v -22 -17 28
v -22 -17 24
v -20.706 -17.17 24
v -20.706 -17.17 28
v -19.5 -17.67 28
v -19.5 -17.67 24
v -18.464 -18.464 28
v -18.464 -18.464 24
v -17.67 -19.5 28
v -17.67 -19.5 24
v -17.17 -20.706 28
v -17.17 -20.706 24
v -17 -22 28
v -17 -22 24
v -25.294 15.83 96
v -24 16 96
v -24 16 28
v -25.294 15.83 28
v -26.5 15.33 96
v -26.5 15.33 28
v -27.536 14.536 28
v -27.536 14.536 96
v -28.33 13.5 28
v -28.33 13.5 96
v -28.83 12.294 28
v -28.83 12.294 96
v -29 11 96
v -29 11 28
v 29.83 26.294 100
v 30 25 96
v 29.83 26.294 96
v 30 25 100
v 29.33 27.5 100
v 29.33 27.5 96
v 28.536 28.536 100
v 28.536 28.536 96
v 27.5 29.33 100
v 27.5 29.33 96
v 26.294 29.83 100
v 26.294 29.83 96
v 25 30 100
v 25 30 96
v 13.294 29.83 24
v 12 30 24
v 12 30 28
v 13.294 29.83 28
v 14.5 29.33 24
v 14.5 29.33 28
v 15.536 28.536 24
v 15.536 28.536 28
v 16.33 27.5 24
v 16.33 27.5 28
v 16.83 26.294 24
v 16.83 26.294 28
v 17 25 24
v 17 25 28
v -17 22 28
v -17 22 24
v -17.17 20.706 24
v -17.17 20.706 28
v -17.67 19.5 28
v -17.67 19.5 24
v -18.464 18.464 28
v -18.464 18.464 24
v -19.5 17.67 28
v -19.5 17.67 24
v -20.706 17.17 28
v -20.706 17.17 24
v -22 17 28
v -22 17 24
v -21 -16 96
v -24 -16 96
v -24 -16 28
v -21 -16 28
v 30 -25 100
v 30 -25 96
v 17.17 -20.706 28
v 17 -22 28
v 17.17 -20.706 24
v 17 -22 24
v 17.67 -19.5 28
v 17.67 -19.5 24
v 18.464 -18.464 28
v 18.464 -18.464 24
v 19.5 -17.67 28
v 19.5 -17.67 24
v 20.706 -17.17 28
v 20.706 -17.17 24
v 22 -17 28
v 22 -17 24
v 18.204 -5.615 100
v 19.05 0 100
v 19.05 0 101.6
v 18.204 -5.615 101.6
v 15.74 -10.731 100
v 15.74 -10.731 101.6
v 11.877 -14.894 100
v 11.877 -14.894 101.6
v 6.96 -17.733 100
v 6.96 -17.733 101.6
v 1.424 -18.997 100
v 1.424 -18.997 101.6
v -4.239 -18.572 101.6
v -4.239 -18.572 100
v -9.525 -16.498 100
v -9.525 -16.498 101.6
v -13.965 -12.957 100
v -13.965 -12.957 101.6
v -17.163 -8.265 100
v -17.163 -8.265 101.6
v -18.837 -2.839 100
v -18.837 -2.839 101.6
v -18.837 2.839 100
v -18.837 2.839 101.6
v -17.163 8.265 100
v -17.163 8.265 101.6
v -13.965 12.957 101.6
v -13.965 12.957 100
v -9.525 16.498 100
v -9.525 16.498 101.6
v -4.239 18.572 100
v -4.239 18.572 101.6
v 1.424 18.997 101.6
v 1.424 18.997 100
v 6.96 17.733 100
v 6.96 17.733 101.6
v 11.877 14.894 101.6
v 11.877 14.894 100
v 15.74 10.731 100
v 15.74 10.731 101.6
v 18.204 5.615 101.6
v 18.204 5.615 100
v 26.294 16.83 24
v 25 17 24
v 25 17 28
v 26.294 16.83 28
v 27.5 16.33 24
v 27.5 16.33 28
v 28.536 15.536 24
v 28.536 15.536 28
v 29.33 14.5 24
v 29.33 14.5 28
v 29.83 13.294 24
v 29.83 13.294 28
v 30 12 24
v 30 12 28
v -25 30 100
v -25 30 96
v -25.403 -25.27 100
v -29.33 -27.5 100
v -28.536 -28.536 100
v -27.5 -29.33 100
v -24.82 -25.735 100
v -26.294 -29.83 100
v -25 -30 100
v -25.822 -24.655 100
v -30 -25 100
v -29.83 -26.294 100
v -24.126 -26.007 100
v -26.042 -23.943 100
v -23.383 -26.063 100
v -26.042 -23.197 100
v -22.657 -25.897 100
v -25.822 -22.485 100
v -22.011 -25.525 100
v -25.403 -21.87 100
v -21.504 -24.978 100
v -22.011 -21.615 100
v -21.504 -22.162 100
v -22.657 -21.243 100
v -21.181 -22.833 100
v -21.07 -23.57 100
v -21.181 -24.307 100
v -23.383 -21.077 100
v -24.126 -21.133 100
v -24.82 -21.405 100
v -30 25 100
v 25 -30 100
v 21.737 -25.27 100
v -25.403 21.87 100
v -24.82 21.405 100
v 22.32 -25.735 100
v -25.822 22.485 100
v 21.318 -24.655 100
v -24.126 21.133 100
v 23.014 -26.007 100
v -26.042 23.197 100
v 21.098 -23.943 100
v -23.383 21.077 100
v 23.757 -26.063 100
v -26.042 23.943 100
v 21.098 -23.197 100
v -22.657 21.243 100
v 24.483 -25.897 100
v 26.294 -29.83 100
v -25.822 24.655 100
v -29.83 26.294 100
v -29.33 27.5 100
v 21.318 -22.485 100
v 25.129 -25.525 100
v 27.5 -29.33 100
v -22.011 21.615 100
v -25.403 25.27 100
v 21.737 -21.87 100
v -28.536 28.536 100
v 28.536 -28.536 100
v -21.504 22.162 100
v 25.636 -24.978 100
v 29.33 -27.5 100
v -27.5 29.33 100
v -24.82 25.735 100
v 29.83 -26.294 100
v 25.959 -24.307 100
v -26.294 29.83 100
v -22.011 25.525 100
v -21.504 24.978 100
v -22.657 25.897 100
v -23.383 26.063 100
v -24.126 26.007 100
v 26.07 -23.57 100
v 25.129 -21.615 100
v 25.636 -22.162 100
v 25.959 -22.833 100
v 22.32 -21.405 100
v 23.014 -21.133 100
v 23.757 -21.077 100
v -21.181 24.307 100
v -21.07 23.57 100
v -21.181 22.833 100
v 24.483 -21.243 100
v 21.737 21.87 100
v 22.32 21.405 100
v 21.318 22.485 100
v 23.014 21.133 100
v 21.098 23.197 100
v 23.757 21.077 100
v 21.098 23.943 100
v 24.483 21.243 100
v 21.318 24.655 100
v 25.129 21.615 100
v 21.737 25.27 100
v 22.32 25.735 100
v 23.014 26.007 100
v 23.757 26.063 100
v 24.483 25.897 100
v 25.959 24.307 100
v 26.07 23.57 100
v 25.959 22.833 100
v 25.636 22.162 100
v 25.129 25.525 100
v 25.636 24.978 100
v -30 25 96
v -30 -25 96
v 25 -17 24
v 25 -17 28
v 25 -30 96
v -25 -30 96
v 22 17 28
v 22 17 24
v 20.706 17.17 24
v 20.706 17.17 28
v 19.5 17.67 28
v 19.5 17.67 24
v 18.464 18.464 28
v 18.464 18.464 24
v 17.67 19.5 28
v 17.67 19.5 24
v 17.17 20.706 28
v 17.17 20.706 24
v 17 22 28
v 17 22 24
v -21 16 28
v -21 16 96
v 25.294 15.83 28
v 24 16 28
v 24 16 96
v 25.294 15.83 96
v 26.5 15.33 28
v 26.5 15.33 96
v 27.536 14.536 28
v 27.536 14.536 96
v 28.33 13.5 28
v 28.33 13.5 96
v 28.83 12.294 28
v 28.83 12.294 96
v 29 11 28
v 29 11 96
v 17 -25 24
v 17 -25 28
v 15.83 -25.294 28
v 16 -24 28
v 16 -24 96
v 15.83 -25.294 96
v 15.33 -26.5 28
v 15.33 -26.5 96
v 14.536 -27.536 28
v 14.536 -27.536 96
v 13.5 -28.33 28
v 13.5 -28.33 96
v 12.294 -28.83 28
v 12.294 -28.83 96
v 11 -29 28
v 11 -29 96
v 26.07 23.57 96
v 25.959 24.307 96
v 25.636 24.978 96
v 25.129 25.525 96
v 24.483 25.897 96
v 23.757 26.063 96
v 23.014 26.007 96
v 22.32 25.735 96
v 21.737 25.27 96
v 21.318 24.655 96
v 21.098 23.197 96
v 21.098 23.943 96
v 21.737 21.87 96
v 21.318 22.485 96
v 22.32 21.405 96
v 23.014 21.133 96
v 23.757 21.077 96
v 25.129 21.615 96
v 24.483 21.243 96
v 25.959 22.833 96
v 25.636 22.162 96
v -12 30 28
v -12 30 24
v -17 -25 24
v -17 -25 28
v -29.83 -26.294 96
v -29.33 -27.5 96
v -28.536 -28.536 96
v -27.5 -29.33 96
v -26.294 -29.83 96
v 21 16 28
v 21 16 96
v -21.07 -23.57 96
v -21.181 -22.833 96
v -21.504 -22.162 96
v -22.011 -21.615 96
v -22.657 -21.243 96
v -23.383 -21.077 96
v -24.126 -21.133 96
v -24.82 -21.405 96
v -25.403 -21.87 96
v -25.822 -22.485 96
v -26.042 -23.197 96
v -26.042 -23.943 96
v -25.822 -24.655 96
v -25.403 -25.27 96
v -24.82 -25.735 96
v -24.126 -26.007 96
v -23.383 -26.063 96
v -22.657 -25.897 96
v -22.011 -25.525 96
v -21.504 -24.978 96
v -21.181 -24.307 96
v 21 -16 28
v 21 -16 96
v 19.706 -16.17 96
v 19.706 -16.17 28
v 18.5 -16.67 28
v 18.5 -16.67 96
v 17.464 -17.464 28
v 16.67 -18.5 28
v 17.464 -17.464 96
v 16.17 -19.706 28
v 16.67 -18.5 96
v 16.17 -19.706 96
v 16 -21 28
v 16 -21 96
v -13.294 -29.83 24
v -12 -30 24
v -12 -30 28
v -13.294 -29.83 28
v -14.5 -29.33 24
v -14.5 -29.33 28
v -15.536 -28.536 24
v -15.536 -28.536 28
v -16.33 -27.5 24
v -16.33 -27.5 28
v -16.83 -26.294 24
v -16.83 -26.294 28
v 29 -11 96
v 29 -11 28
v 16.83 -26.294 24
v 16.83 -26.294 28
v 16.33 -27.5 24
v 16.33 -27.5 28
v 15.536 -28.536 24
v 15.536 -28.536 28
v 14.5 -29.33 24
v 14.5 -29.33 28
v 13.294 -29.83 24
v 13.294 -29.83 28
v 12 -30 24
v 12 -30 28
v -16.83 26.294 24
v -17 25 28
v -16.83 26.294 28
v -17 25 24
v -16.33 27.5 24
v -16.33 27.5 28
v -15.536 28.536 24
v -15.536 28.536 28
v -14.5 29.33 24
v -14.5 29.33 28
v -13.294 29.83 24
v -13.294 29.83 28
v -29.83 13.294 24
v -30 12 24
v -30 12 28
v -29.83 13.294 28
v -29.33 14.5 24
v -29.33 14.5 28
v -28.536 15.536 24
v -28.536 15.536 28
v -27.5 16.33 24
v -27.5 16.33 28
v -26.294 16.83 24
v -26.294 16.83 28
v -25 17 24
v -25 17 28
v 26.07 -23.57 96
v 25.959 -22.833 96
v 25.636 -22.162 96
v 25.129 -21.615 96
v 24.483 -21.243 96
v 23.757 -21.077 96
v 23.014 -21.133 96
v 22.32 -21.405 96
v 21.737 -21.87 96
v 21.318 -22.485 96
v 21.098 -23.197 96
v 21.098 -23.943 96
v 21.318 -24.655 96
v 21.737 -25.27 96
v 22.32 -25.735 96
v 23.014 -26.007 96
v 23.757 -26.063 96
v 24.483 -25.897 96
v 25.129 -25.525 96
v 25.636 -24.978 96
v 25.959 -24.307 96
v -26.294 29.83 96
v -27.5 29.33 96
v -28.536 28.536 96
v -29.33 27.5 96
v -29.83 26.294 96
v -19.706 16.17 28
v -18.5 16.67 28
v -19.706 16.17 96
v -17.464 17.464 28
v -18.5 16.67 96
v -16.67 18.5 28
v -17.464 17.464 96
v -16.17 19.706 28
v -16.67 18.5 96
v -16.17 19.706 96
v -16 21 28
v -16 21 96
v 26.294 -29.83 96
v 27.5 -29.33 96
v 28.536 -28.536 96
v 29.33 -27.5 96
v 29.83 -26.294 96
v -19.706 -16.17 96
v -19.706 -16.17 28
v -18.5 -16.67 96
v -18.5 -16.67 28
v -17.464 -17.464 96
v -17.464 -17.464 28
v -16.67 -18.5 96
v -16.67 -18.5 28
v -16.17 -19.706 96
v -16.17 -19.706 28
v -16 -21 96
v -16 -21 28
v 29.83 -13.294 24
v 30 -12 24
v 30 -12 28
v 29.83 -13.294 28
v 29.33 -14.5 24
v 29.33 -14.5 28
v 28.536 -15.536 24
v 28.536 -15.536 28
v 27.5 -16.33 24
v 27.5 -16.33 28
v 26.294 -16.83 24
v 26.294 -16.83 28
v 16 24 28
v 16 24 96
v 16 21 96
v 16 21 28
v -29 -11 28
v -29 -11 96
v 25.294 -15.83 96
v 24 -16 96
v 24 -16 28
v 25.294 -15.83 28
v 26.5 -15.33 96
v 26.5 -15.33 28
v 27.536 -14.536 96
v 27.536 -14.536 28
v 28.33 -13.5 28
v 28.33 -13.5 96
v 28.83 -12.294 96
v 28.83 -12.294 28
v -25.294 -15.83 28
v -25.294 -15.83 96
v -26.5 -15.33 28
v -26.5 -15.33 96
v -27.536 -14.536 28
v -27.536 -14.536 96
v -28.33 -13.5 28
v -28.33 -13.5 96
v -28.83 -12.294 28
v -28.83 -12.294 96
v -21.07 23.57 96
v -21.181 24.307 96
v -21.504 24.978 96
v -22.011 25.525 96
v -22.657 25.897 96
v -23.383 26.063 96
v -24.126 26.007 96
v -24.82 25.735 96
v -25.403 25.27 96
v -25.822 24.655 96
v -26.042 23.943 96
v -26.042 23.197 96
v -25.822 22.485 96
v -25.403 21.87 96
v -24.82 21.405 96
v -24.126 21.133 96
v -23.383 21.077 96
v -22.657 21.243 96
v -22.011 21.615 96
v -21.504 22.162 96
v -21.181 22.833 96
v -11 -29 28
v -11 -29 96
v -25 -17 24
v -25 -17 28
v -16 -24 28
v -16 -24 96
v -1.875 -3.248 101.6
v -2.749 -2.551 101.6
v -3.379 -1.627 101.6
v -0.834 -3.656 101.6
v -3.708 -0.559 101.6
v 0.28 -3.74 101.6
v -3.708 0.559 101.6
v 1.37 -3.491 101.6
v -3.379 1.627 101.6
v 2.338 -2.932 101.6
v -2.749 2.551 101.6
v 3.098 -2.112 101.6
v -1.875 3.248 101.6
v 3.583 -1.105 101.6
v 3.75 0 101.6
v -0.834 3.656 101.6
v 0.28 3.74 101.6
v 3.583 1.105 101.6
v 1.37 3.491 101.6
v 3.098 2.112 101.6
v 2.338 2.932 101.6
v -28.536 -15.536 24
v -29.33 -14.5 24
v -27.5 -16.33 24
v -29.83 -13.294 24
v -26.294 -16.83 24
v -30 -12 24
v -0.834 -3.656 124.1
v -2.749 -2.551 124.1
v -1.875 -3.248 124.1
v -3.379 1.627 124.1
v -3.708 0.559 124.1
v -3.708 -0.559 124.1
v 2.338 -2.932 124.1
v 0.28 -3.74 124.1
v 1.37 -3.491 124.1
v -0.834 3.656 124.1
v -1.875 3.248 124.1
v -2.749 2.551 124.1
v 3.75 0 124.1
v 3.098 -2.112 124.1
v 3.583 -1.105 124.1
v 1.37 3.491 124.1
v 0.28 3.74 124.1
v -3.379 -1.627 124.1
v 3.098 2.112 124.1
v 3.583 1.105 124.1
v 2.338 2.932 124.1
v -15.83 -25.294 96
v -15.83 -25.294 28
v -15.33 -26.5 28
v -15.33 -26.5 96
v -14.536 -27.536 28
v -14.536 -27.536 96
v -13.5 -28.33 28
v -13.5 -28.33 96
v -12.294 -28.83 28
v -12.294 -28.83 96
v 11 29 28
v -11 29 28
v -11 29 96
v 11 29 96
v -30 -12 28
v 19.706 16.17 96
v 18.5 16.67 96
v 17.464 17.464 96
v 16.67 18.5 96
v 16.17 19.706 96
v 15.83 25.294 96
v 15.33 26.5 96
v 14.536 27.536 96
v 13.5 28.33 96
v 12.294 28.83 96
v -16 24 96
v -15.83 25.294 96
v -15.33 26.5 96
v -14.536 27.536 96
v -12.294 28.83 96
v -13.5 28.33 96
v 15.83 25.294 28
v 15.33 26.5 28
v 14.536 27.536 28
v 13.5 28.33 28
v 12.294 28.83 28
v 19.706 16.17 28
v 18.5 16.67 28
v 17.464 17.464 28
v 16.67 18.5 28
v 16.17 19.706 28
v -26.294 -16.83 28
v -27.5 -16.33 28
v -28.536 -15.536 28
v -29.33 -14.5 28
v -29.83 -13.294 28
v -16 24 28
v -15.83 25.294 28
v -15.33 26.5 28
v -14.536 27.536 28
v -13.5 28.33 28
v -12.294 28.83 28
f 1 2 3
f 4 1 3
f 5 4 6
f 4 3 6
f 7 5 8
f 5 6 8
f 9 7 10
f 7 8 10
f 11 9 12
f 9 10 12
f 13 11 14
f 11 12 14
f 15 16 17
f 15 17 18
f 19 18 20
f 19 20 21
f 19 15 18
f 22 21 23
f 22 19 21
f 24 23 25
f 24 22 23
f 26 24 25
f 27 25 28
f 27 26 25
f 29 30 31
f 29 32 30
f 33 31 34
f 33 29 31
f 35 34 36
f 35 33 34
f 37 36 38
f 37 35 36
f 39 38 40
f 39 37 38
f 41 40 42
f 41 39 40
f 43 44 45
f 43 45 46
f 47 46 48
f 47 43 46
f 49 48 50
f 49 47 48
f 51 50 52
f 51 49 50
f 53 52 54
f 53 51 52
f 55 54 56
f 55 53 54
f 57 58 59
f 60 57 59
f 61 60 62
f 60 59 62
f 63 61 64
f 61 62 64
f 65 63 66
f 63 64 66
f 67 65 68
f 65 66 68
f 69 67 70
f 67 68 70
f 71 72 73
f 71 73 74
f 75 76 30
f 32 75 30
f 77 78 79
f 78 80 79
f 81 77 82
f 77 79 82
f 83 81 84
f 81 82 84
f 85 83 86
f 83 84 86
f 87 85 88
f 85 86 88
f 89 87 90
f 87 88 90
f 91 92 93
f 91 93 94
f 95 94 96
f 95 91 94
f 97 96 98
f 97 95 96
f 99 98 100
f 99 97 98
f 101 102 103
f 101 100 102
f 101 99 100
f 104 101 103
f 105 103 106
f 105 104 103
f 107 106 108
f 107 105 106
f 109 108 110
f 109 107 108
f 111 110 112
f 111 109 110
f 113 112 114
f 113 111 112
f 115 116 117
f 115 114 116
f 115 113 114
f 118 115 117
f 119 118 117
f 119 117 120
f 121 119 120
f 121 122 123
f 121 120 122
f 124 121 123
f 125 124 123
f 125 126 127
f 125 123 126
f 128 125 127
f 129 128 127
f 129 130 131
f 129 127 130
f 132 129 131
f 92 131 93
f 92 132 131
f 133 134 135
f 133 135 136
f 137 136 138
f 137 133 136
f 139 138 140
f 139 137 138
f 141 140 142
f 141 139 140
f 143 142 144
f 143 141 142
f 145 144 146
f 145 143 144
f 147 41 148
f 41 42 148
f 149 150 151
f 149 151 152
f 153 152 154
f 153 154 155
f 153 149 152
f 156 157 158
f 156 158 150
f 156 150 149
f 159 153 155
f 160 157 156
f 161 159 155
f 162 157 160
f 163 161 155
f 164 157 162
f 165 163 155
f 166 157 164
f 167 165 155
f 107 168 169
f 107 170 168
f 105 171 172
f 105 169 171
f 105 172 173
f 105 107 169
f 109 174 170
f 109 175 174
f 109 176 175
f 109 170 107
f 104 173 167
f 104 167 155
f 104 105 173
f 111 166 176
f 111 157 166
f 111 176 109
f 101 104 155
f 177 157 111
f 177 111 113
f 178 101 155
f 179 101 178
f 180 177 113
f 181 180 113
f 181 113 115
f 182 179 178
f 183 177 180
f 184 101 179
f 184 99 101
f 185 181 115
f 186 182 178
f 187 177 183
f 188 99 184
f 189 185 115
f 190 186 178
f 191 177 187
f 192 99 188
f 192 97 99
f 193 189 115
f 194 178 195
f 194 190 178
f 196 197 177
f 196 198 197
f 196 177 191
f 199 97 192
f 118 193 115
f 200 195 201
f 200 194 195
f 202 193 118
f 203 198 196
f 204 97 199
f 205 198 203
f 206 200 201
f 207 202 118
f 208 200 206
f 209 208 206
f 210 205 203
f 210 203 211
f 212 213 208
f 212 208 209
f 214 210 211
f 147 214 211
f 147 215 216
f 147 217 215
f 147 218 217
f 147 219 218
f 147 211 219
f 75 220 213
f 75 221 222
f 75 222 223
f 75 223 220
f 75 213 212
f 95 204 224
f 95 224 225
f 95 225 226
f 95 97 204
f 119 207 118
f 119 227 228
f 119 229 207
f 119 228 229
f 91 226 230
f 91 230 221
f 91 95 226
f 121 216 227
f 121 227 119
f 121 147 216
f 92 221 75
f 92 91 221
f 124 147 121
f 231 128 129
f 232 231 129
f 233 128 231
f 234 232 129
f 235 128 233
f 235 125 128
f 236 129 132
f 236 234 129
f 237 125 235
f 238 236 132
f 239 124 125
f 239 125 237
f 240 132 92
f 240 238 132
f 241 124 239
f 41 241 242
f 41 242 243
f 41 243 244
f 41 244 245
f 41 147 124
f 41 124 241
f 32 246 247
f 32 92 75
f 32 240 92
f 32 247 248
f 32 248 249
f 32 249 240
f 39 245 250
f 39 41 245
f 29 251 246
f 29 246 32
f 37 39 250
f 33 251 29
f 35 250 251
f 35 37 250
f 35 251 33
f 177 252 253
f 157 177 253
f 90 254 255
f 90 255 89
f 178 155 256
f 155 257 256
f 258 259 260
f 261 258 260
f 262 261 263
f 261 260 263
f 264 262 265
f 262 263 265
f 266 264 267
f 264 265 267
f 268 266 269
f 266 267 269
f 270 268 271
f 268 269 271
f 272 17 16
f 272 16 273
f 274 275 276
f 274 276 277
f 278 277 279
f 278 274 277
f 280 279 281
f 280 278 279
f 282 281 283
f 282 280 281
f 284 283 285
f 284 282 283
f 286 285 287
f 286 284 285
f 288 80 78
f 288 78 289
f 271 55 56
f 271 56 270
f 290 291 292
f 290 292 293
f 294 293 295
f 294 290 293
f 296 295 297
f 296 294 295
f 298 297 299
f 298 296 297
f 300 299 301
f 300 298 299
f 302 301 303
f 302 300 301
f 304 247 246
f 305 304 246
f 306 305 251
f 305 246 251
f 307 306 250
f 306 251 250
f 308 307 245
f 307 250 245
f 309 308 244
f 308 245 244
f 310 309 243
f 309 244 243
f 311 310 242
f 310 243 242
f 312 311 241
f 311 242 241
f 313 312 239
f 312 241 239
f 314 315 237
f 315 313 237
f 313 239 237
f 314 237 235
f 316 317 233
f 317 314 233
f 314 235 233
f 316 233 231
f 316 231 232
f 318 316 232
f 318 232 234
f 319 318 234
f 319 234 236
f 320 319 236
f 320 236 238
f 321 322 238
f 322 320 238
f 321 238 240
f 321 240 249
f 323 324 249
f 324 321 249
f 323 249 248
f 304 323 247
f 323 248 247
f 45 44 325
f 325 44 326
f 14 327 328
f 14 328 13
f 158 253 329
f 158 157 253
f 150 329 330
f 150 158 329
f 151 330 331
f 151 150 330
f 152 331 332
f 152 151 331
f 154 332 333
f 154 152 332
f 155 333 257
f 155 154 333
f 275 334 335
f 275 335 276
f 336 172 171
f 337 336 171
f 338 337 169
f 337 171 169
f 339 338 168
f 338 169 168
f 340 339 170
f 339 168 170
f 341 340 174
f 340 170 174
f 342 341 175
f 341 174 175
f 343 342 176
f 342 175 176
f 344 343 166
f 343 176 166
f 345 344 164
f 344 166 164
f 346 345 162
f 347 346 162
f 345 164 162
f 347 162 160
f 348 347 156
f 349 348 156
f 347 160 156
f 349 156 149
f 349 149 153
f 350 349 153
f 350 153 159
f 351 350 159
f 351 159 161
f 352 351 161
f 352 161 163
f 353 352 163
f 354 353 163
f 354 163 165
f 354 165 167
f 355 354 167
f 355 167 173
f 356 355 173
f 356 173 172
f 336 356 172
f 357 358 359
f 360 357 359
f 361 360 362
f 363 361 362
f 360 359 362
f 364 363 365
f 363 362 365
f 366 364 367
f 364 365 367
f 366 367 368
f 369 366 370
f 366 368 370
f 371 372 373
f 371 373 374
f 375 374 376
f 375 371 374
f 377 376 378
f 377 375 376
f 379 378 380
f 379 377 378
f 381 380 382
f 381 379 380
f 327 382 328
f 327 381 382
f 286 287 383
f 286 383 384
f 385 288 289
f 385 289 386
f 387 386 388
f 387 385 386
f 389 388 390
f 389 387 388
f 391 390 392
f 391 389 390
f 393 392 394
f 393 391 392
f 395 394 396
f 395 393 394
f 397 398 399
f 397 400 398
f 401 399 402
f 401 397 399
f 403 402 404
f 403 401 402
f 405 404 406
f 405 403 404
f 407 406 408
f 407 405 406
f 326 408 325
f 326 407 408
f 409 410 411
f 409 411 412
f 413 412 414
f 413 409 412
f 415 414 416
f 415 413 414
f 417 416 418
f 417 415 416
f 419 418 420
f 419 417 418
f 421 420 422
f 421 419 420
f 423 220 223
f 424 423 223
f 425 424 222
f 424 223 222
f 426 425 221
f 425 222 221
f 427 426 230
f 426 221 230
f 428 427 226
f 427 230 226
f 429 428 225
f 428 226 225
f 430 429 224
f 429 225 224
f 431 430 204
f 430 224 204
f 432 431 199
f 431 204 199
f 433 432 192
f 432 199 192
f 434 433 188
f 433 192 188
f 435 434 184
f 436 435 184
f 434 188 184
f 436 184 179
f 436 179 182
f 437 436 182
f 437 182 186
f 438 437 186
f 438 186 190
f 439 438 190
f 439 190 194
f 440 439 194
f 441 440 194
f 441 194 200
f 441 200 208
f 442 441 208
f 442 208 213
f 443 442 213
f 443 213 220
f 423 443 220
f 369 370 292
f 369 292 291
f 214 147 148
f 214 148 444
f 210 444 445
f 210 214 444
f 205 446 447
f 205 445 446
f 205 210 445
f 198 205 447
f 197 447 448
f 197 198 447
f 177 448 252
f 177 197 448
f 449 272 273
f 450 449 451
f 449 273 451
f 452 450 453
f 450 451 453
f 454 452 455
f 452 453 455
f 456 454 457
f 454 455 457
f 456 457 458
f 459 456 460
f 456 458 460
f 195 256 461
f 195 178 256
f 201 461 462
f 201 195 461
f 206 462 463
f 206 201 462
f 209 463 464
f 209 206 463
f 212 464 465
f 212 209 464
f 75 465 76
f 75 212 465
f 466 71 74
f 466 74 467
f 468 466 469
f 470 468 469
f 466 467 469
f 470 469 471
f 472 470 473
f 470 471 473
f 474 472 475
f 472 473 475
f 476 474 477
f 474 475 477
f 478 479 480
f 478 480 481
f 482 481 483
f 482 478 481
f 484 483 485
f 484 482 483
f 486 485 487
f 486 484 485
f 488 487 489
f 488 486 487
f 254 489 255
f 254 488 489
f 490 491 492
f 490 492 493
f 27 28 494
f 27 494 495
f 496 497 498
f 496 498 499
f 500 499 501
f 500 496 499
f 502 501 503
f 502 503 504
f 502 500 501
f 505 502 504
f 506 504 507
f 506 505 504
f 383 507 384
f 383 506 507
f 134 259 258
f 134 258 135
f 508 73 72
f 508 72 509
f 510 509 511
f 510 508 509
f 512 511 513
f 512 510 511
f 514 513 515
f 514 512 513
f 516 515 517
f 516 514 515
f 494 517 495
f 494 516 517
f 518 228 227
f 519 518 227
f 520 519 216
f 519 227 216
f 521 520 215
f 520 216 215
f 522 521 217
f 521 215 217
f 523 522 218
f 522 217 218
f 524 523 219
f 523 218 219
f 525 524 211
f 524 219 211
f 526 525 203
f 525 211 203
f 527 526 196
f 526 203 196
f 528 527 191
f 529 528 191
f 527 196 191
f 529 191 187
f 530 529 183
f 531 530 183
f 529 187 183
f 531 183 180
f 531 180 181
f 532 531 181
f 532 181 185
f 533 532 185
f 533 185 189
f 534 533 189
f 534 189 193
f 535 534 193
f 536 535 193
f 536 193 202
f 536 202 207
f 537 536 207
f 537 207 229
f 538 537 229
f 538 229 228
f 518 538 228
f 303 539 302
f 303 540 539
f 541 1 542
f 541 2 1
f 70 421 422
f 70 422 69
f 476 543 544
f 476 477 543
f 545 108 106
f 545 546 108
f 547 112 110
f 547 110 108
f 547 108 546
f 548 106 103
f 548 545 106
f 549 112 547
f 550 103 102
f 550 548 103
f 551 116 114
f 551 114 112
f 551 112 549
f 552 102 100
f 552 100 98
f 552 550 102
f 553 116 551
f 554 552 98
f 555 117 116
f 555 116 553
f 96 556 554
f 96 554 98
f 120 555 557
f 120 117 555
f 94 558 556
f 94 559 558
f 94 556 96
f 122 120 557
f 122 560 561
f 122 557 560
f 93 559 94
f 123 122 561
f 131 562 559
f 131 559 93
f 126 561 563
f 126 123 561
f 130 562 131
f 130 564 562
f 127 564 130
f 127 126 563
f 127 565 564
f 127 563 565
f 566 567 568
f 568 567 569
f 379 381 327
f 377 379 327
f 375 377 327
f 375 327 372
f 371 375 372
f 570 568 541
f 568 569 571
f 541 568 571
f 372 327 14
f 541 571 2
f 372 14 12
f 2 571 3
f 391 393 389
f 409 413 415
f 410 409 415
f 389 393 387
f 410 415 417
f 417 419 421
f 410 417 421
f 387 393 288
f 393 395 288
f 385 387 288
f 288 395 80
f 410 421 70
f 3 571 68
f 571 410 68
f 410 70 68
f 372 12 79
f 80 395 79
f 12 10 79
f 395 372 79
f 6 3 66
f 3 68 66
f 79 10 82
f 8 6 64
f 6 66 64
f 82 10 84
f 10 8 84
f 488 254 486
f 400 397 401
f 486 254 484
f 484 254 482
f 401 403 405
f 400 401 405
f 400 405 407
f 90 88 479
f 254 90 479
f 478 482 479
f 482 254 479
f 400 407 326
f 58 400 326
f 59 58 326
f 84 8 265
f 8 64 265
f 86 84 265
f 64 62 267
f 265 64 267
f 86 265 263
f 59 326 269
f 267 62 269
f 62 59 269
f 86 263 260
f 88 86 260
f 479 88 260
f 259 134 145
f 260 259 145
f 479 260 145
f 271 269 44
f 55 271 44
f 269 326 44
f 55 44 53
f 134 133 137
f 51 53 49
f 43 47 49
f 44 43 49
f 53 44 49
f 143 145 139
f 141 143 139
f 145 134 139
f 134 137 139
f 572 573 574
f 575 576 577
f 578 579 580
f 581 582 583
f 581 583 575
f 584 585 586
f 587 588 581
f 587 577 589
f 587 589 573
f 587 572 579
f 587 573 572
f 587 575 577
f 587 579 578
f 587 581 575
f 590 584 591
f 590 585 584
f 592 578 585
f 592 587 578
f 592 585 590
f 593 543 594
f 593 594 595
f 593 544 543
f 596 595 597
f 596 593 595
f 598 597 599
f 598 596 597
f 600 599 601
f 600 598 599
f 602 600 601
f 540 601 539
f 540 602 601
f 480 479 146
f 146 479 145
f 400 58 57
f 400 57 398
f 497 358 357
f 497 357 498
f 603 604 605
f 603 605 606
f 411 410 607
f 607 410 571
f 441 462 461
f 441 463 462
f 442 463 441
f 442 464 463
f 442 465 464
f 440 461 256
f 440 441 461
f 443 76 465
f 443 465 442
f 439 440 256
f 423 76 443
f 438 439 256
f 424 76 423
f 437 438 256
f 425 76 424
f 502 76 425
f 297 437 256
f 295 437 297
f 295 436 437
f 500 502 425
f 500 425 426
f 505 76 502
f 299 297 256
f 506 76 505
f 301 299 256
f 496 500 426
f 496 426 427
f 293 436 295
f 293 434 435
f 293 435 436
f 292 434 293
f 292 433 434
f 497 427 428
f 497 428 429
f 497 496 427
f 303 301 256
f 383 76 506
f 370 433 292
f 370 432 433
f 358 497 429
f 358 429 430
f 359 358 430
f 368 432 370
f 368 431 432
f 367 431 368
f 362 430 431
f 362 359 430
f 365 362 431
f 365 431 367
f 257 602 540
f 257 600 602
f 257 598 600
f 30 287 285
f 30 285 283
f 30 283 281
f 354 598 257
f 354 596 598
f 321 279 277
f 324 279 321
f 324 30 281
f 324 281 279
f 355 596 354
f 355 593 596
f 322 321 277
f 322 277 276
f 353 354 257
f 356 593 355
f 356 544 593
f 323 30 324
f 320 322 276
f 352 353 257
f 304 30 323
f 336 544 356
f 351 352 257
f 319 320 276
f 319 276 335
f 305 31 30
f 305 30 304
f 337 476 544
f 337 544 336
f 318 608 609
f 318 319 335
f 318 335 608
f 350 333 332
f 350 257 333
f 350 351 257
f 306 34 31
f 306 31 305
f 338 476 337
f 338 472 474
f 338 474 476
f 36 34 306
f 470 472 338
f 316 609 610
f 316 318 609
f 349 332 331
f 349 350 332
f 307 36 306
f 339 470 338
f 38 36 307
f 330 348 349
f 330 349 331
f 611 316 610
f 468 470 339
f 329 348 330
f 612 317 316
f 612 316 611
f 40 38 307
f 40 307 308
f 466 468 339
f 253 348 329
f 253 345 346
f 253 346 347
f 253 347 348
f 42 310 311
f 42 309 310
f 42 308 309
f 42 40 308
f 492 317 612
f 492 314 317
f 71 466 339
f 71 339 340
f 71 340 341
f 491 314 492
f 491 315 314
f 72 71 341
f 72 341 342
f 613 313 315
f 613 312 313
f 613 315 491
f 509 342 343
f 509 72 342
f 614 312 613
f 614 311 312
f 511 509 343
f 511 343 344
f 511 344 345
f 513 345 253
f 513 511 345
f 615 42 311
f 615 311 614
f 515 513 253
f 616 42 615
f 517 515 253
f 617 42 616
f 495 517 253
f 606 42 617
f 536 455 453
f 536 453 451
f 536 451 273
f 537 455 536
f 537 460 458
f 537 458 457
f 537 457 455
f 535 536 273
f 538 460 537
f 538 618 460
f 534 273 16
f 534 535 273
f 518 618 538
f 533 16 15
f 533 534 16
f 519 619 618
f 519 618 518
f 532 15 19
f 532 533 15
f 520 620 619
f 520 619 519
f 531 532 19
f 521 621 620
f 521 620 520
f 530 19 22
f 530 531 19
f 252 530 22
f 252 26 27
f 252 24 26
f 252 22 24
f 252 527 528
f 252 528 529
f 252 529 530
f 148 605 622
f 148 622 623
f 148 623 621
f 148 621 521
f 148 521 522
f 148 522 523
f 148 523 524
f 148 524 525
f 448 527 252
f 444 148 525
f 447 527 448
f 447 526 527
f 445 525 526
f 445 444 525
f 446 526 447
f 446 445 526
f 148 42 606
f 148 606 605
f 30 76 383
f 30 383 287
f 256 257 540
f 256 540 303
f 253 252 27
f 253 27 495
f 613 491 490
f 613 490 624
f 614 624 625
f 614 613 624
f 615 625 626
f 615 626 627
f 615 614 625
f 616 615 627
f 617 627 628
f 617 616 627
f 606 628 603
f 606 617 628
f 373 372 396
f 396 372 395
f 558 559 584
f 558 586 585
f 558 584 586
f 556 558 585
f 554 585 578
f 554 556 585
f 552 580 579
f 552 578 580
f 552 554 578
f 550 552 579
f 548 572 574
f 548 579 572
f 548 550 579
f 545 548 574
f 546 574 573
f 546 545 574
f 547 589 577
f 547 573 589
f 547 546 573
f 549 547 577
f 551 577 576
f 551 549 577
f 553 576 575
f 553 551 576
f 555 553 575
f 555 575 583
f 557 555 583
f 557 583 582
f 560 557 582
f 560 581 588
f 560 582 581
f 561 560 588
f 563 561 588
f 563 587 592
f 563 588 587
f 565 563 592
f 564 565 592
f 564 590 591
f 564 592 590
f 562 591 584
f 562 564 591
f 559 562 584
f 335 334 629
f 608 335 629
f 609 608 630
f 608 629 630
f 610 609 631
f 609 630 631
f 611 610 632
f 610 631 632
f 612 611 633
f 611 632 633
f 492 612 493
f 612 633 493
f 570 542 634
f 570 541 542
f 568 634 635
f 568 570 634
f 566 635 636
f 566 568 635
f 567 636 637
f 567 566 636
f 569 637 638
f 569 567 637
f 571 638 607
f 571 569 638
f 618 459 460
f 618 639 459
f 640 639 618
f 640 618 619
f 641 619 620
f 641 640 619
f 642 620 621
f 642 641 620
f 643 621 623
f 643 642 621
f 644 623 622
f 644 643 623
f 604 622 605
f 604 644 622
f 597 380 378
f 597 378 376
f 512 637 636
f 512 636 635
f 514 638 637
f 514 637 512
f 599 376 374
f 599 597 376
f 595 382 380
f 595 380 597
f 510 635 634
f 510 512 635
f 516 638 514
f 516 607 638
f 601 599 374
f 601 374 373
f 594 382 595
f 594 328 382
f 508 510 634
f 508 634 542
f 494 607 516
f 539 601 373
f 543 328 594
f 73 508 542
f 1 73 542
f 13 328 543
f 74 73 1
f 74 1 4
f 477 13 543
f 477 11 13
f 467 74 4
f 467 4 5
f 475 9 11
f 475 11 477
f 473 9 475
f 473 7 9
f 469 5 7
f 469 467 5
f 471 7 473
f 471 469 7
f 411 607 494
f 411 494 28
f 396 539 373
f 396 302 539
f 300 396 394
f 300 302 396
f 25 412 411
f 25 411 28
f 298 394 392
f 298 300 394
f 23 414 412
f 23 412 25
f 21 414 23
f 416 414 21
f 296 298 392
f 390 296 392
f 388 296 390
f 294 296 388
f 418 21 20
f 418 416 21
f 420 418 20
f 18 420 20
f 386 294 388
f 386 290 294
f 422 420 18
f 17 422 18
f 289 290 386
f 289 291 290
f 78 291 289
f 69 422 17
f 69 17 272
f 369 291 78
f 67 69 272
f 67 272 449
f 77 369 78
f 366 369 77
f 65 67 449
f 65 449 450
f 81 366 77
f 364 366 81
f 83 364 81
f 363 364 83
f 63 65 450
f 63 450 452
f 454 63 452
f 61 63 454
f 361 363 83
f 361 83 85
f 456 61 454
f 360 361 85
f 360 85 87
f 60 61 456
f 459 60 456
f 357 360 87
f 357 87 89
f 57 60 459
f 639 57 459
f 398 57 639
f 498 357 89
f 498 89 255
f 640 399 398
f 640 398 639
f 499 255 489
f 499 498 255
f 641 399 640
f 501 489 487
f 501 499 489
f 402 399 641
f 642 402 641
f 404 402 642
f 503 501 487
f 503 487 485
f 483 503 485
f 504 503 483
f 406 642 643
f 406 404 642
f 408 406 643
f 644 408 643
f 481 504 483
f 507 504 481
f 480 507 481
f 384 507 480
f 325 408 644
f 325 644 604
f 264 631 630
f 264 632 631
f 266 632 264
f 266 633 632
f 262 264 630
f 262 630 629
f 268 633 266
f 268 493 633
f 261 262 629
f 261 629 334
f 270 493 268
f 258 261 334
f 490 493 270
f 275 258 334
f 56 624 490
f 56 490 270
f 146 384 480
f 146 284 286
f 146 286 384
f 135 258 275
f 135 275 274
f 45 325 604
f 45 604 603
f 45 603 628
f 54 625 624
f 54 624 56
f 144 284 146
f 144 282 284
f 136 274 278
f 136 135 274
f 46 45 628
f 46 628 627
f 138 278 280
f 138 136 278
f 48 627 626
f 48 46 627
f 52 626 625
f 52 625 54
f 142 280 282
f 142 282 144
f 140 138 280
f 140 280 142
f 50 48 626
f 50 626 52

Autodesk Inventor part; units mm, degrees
ref_plane "YZ Plane" through (0, 0, 0) normal (1, 0, 0) x (0, 1, 0)
ref_plane "XZ Plane" through (0, 0, 0) normal (0, 1, 0) x (-1, 0, 0)
sketch "Szkic1" plane through (0, 0, 0) normal (0, 0, 1) x (1, 0, 0)
  line L0 (-30, -30) -> (30, -30)
  line L1 (30, -30) -> (30, 30)
  line L2 (30, 30) -> (-30, 30)
  line L3 (-30, 30) -> (-30, -30)
  line L4 (-30, -30) -> (30, 30) construction
  line L5 (30, -30) -> (-30, 30) construction
  point P0 (0, 0)
  dimension "d0" = 60
  dimension "d1" = 60
extrude "Wyciągnięcie proste1" add sketch "Szkic1" along normal blind 100
sketch "Szkic2" plane through (0, 0, 100) normal (0, 0, 1) x (1, 0, 0)
  circle A0 centre (0, 0) radius 19.05
  dimension "d4" = 38.1
extrude "Wyciągnięcie proste2" add sketch "Szkic2" along normal blind 1.6
sketch "Szkic3" plane through (0, 0, 100) normal (0, 0, 1) x (1, 0, 0)
  line L0 (0, 0) -> (0, 23.57)
  line L1 (30, -30) -> (30, 30) projected
  line L2 (-30, 30) -> (-30, -30) projected
  line L3 (0, 0) -> (0, -23.57)
  line L4 (0, -23.57) -> (23.57, -23.57)
  line L5 (0, -23.57) -> (-23.57, -23.57)
  line L6 (0, 23.57) -> (-23.57, 23.57)
  line L7 (0, 23.57) -> (23.57, 23.57)
  circle A0 centre (23.57, 23.57) radius 2.5
  circle A1 centre (-23.57, 23.57) radius 2.5
  circle A2 centre (-23.57, -23.57) radius 2.5
  circle A3 centre (23.57, -23.57) radius 2.5
  dimension "d13" = 47.14
  dimension "d14" = 47.14
  dimension "d15" = 47.14
  dimension "d16" = 5
  dimension "d17" = 5
  dimension "d18" = 5
  dimension "d19" = 5
extrude "Wyciągnięcie proste3" cut sketch "Szkic3" against normal up to next
sketch "Szkic4" plane through (0, 0, 0) normal (0, 0, -1) x (-1, 0, 0)
  circle A0 centre (23.57, -23.57) radius 2.5 projected
  circle A1 centre (-23.57, 23.57) radius 2.5 projected
  circle A2 centre (23.57, 23.57) radius 2.5 projected
  circle A3 centre (-23.57, -23.57) radius 2.5 projected
  line L0 (30, -30) -> (-30, -30) projected
  line L1 (30, 30) -> (30, -30) projected
  line L2 (-30, 30) -> (30, 30) projected
  line L3 (-30, -30) -> (-30, 30) projected
  line L4 (-30, -30) -> (-30, 30) projected
  line L5 (-17, -17) -> (-17, -30)
  line L6 (17, -17) -> (17, -30)
  line L7 (30, 30) -> (30, -30) projected
  line L8 (-17, -17) -> (-30, -17)
  line L9 (17, 17) -> (30, 17)
  line L10 (-17, 17) -> (-17, 30)
  line L11 (-17, 17) -> (-30, 17)
  line L12 (17, 17) -> (17, 30)
  line L13 (17, -17) -> (30, -17)
  point P0 (0, 0)
extrude "Wyciągnięcie proste4" cut sketch "Szkic4" against normal blind 96 contours L0 L6 L13 L1 | L0 L3 L8 L5 | L9 L12 L2 L1 | L3 L2 L10 L11
sketch "Szkic5" plane through (0, 0, 101.6) normal (0, 0, 1) x (1, 0, 0)
  circle A0 centre (0, 0) radius 3.75
  dimension "d25" = 7.5
extrude "Wyciągnięcie proste5" add sketch "Szkic5" along normal blind 22.5
sketch "Szkic6" plane through (-30, 30, 100) normal (0, 1, 0) x (1, 0, 0)
  line L0 (13, 100) -> (13, 4) projected
  line L1 (13, 4) -> (0, 4) projected
  line L2 (0, 4) -> (0, 0) projected
  line L3 (60, 0) -> (0, 0) projected
  line L4 (60, 4) -> (60, 0) projected
  line L5 (60, 4) -> (47, 4) projected
  line L6 (47, 4) -> (47, 100) projected
  line L7 (47, 100) -> (13, 100) projected
  line L8 (13, 4) -> (47, 4)
  line L9 (13, 100) -> (13, 4) projected
  line L10 (13, 100) -> (13, 96)
  line L11 (13, 96) -> (47, 96)
  point P0 (30, 100)
  dimension "d28" = 4
extrude "Wyciągnięcie proste6" cut sketch "Szkic6" against normal blind 1 contours L11 L6 L8 L0
sketch "Szkic7" plane through (-30, -30, 100) normal (-1, 0, 0) x (0, 0, 1)
  line L0 (-4, 47) -> (-100, 47) projected
  line L1 (-100, 47) -> (-100, 13) projected
  line L2 (-100, 13) -> (-4, 13) projected
  line L3 (-4, 13) -> (-4, 0) projected
  line L4 (-4, 0) -> (0, 0) projected
  line L5 (0, 60) -> (0, 0) projected
  line L6 (-4, 60) -> (0, 60) projected
  line L7 (-4, 60) -> (-4, 47) projected
  line L8 (-100, 47) -> (-4, 47) projected
  line L9 (-100, 13) -> (-4, 13) projected
  line L10 (-4, 47) -> (-4, 13)
  line L11 (-100, 47) -> (-100, 13) projected
  line L12 (-96, 13) -> (-96, 47)
  point P0 (-100, 30)
sketch "Szkic8" plane through (-30, -30, 100) normal (0, -1, 0) x (1, 0, 0)
  line L0 (13, -4) -> (13, -100) projected
  line L1 (13, -100) -> (47, -100) projected
  line L2 (47, -100) -> (47, -4) projected
  line L3 (47, -4) -> (60, -4) projected
  line L4 (60, -4) -> (60, 0) projected
  line L5 (0, 0) -> (60, 0) projected
  line L6 (0, -4) -> (0, 0) projected
  line L7 (0, -4) -> (13, -4) projected
  line L8 (47, -4) -> (13, -4) projected
  line L9 (13, -4) -> (47, -4)
  line L10 (47, -100) -> (47, -96)
  line L11 (47, -100) -> (47, -4) projected
  line L12 (47, -96) -> (13, -96)
  point P0 (30, -100)
  dimension "d34" = 4
sketch "Szkic9" plane through (30, -30, 100) normal (1, 0, 0) x (0, 0, -1)
  line L0 (4, 13) -> (100, 13) projected
  line L1 (100, 13) -> (100, 47) projected
  line L2 (100, 47) -> (4, 47) projected
  line L3 (4, 47) -> (4, 60) projected
  line L4 (4, 60) -> (0, 60) projected
  line L5 (0, 0) -> (0, 60) projected
  line L6 (4, 0) -> (0, 0) projected
  line L7 (4, 0) -> (4, 13) projected
  line L8 (4, 47) -> (4, 13) projected
  line L9 (4, 13) -> (4, 47)
  line L10 (100, 47) -> (100, 60) projected
  line L11 (100, 47) -> (96, 47)
  line L12 (100, 47) -> (4, 47) projected
  line L13 (96, 47) -> (96, 13)
  line L14 (100, 13) -> (4, 13) projected
  point P0 (100, 30)
  dimension "d37" = 4
extrude "Wyciągnięcie proste10" cut sketch "Szkic8" against normal blind 1 contours L8 L2 L12 L0
extrude "Wyciągnięcie proste11" cut sketch "Szkic7" against normal blind 1 contours L10 L2 L12 L0
extrude "Wyciągnięcie proste12" cut sketch "Szkic9" against normal blind 1 contours L8 L2 L13 L0
sketch "Szkic10" plane through (-30, 17, 0) normal (0, 1, 0) x (1, 0, 0)
  line L0 (1, -4) -> (1, -96)
  line L1 (1, -96) -> (13, -96)
  line L2 (13, -4) -> (13, -96)
  line L3 (1, -4) -> (1, -96)
  line L4 (1, -4) -> (13, -4)
  point P0 (30, 0)
extrude "Wyciągnięcie proste13" cut sketch "Szkic10" against normal blind 1
sketch "Szkic11" plane through (-17, 17, 0) normal (-1, 0, 0) x (0, 0, 1)
  line L0 (4, 0) -> (4, -1)
  line L1 (4, -1) -> (96, -1)
  line L2 (96, -1) -> (96, 12)
  line L3 (96, 12) -> (4, 12)
  line L4 (96, 12) -> (4, 12)
  line L5 (4, 12) -> (4, 0)
  point P0 (0, -17)
extrude "Wyciągnięcie proste14" cut sketch "Szkic11" against normal blind 1
sketch "Szkic12" plane through (17, 17, 0) normal (0, 1, 0) x (1, 0, 0)
  line L0 (12, -96) -> (12, -4)
  line L1 (0, -4) -> (0, -96)
  line L2 (0, -96) -> (12, -96)
  line L3 (12, -4) -> (0, -4)
  point P0 (-17, 0)
extrude "Wyciągnięcie proste15" cut sketch "Szkic12" against normal blind 1
sketch "Szkic13" plane through (17, 17, 0) normal (1, 0, 0) x (0, 0, -1)
  line L0 (-4, 12) -> (-96, 12)
  line L1 (-96, 12) -> (-96, -1)
  line L2 (-96, -1) -> (-4, -1)
  line L3 (-4, 0) -> (-4, -1)
  line L4 (-4, -1) -> (-4, 12)
  line L5 (-4, 0) -> (-4, 12)
  point P0 (0, -17)
extrude "Wyciągnięcie proste16" cut sketch "Szkic13" against normal blind 1
sketch "Szkic14" plane through (17, -17, 0) normal (0, -1, 0) x (1, 0, 0)
  line L0 (12, 4) -> (12, 96)
  line L1 (12, 96) -> (0, 96)
  line L2 (0, 4) -> (0, 96)
  line L3 (0, 4) -> (12, 4)
  line L4 (-1, 4) -> (-1, 96)
  point P0 (-17, 0)
extrude "Wyciągnięcie proste17" cut sketch "Szkic14" against normal blind 1
sketch "Szkic15" plane through (17, -30, 0) normal (1, 0, 0) x (0, 0, -1)
  line L0 (-96, 1) -> (-4, 1)
  line L1 (-4, 13) -> (-4, 14)
  line L2 (-4, 14) -> (-96, 14)
  line L3 (-96, 14) -> (-96, 1)
  line L4 (-4, 1) -> (-96, 1)
  line L5 (-4, 1) -> (-4, 13)
  point P0 (0, 30)
extrude "Wyciągnięcie proste18" cut sketch "Szkic15" against normal blind 1
sketch "Szkic16" plane through (-30, -17, 0) normal (0, -1, 0) x (1, 0, 0)
  line L0 (1, 96) -> (1, 4)
  line L1 (13, 4) -> (13, 96)
  line L2 (13, 96) -> (1, 96)
  line L3 (1, 4) -> (14, 4)
  line L4 (13, 4) -> (1, 4)
  point P0 (30, 0)
extrude "Wyciągnięcie proste19" cut sketch "Szkic16" against normal blind 1
sketch "Szkic17" plane through (-17, -30, 0) normal (-1, 0, 0) x (0, 0, 1)
  line L0 (4, 1) -> (96, 1)
  line L1 (96, 1) -> (96, 14)
  line L2 (96, 14) -> (4, 14)
  line L3 (4, 13) -> (4, 14)
  line L4 (4, 14) -> (4, 1)
  line L5 (4, 13) -> (4, 1)
  point P0 (0, 30)
extrude "Wyciągnięcie proste20" cut sketch "Szkic17" against normal blind 1
fillet "Zaokrąglenie1" radius 5 28 edges at (-30, 30, 98) (30, 30, 98) (30, -30, 98) (-30, -30, 98) (-16, -16, 50) (-29, -16, 50) (-16, -29, 50) (16, -29, 50) (16, -16, 50) (29, -16, 50) (29, 16, 50) (16, 16, 50) (16, 29, 50) (-16, 29, 50) (-16, 16, 50) (-29, 16, 50) (-30, 17, 2) (-17, 17, 2) (-17, 30, 2) (17, 30, 2) (17, 17, 2) (30, 17, 2) (30, -17, 2) (17, -17, 2) (17, -30, 2) (-17, -30, 2) (-17, -17, 2) (-30, -17, 2)
ref_plane "Płaszczyzna konstrukcyjna1" through (0, 0, 24) normal (0, 0, 1) x (1, 0, 0)
sketch "Szkic19" plane through (0, 0, 24) normal (0, 0, 1) x (1, 0, 0)
  arc A0 (-30, -12) -> (-25, -17) centre (-25, -12) ccw projected
  line L0 (-30, 12) -> (-30, -12) projected
  arc A1 (-25, 17) -> (-30, 12) centre (-25, 12) ccw projected
  line L1 (-25, 17) -> (-22, 17) projected
  arc A2 (-22, 17) -> (-17, 22) centre (-22, 22) ccw projected
  line L2 (-17, 22) -> (-17, 25) projected
  arc A3 (-12, 30) -> (-17, 25) centre (-12, 25) ccw projected
  line L3 (12, 30) -> (-12, 30) projected
  arc A4 (17, 25) -> (12, 30) centre (12, 25) ccw projected
  line L4 (17, 25) -> (17, 22) projected
  arc A5 (17, 22) -> (22, 17) centre (22, 22) ccw projected
  line L5 (22, 17) -> (25, 17) projected
  arc A6 (30, 12) -> (25, 17) centre (25, 12) ccw projected
  line L6 (30, -12) -> (30, 12) projected
  arc A7 (25, -17) -> (30, -12) centre (25, -12) ccw projected
  line L7 (25, -17) -> (22, -17) projected
  arc A8 (22, -17) -> (17, -22) centre (22, -22) ccw projected
  line L8 (17, -22) -> (17, -25) projected
  arc A9 (12, -30) -> (17, -25) centre (12, -25) ccw projected
  line L9 (-12, -30) -> (12, -30) projected
  arc A10 (-17, -25) -> (-12, -30) centre (-12, -25) ccw projected
  line L10 (-17, -25) -> (-17, -22) projected
  arc A11 (-17, -22) -> (-22, -17) centre (-22, -22) ccw projected
  line L11 (-22, -17) -> (-25, -17) projected
  point P0 (0, 0)
extrude "Wyciągnięcie proste21" add sketch "Szkic19" along normal blind 4
split "Podział1" plane through (0, 0, 24) removes the side toward (0, 0, -1)
properties part number "Silnik krokowy SM 60 100-4004AF - 4Nm"
